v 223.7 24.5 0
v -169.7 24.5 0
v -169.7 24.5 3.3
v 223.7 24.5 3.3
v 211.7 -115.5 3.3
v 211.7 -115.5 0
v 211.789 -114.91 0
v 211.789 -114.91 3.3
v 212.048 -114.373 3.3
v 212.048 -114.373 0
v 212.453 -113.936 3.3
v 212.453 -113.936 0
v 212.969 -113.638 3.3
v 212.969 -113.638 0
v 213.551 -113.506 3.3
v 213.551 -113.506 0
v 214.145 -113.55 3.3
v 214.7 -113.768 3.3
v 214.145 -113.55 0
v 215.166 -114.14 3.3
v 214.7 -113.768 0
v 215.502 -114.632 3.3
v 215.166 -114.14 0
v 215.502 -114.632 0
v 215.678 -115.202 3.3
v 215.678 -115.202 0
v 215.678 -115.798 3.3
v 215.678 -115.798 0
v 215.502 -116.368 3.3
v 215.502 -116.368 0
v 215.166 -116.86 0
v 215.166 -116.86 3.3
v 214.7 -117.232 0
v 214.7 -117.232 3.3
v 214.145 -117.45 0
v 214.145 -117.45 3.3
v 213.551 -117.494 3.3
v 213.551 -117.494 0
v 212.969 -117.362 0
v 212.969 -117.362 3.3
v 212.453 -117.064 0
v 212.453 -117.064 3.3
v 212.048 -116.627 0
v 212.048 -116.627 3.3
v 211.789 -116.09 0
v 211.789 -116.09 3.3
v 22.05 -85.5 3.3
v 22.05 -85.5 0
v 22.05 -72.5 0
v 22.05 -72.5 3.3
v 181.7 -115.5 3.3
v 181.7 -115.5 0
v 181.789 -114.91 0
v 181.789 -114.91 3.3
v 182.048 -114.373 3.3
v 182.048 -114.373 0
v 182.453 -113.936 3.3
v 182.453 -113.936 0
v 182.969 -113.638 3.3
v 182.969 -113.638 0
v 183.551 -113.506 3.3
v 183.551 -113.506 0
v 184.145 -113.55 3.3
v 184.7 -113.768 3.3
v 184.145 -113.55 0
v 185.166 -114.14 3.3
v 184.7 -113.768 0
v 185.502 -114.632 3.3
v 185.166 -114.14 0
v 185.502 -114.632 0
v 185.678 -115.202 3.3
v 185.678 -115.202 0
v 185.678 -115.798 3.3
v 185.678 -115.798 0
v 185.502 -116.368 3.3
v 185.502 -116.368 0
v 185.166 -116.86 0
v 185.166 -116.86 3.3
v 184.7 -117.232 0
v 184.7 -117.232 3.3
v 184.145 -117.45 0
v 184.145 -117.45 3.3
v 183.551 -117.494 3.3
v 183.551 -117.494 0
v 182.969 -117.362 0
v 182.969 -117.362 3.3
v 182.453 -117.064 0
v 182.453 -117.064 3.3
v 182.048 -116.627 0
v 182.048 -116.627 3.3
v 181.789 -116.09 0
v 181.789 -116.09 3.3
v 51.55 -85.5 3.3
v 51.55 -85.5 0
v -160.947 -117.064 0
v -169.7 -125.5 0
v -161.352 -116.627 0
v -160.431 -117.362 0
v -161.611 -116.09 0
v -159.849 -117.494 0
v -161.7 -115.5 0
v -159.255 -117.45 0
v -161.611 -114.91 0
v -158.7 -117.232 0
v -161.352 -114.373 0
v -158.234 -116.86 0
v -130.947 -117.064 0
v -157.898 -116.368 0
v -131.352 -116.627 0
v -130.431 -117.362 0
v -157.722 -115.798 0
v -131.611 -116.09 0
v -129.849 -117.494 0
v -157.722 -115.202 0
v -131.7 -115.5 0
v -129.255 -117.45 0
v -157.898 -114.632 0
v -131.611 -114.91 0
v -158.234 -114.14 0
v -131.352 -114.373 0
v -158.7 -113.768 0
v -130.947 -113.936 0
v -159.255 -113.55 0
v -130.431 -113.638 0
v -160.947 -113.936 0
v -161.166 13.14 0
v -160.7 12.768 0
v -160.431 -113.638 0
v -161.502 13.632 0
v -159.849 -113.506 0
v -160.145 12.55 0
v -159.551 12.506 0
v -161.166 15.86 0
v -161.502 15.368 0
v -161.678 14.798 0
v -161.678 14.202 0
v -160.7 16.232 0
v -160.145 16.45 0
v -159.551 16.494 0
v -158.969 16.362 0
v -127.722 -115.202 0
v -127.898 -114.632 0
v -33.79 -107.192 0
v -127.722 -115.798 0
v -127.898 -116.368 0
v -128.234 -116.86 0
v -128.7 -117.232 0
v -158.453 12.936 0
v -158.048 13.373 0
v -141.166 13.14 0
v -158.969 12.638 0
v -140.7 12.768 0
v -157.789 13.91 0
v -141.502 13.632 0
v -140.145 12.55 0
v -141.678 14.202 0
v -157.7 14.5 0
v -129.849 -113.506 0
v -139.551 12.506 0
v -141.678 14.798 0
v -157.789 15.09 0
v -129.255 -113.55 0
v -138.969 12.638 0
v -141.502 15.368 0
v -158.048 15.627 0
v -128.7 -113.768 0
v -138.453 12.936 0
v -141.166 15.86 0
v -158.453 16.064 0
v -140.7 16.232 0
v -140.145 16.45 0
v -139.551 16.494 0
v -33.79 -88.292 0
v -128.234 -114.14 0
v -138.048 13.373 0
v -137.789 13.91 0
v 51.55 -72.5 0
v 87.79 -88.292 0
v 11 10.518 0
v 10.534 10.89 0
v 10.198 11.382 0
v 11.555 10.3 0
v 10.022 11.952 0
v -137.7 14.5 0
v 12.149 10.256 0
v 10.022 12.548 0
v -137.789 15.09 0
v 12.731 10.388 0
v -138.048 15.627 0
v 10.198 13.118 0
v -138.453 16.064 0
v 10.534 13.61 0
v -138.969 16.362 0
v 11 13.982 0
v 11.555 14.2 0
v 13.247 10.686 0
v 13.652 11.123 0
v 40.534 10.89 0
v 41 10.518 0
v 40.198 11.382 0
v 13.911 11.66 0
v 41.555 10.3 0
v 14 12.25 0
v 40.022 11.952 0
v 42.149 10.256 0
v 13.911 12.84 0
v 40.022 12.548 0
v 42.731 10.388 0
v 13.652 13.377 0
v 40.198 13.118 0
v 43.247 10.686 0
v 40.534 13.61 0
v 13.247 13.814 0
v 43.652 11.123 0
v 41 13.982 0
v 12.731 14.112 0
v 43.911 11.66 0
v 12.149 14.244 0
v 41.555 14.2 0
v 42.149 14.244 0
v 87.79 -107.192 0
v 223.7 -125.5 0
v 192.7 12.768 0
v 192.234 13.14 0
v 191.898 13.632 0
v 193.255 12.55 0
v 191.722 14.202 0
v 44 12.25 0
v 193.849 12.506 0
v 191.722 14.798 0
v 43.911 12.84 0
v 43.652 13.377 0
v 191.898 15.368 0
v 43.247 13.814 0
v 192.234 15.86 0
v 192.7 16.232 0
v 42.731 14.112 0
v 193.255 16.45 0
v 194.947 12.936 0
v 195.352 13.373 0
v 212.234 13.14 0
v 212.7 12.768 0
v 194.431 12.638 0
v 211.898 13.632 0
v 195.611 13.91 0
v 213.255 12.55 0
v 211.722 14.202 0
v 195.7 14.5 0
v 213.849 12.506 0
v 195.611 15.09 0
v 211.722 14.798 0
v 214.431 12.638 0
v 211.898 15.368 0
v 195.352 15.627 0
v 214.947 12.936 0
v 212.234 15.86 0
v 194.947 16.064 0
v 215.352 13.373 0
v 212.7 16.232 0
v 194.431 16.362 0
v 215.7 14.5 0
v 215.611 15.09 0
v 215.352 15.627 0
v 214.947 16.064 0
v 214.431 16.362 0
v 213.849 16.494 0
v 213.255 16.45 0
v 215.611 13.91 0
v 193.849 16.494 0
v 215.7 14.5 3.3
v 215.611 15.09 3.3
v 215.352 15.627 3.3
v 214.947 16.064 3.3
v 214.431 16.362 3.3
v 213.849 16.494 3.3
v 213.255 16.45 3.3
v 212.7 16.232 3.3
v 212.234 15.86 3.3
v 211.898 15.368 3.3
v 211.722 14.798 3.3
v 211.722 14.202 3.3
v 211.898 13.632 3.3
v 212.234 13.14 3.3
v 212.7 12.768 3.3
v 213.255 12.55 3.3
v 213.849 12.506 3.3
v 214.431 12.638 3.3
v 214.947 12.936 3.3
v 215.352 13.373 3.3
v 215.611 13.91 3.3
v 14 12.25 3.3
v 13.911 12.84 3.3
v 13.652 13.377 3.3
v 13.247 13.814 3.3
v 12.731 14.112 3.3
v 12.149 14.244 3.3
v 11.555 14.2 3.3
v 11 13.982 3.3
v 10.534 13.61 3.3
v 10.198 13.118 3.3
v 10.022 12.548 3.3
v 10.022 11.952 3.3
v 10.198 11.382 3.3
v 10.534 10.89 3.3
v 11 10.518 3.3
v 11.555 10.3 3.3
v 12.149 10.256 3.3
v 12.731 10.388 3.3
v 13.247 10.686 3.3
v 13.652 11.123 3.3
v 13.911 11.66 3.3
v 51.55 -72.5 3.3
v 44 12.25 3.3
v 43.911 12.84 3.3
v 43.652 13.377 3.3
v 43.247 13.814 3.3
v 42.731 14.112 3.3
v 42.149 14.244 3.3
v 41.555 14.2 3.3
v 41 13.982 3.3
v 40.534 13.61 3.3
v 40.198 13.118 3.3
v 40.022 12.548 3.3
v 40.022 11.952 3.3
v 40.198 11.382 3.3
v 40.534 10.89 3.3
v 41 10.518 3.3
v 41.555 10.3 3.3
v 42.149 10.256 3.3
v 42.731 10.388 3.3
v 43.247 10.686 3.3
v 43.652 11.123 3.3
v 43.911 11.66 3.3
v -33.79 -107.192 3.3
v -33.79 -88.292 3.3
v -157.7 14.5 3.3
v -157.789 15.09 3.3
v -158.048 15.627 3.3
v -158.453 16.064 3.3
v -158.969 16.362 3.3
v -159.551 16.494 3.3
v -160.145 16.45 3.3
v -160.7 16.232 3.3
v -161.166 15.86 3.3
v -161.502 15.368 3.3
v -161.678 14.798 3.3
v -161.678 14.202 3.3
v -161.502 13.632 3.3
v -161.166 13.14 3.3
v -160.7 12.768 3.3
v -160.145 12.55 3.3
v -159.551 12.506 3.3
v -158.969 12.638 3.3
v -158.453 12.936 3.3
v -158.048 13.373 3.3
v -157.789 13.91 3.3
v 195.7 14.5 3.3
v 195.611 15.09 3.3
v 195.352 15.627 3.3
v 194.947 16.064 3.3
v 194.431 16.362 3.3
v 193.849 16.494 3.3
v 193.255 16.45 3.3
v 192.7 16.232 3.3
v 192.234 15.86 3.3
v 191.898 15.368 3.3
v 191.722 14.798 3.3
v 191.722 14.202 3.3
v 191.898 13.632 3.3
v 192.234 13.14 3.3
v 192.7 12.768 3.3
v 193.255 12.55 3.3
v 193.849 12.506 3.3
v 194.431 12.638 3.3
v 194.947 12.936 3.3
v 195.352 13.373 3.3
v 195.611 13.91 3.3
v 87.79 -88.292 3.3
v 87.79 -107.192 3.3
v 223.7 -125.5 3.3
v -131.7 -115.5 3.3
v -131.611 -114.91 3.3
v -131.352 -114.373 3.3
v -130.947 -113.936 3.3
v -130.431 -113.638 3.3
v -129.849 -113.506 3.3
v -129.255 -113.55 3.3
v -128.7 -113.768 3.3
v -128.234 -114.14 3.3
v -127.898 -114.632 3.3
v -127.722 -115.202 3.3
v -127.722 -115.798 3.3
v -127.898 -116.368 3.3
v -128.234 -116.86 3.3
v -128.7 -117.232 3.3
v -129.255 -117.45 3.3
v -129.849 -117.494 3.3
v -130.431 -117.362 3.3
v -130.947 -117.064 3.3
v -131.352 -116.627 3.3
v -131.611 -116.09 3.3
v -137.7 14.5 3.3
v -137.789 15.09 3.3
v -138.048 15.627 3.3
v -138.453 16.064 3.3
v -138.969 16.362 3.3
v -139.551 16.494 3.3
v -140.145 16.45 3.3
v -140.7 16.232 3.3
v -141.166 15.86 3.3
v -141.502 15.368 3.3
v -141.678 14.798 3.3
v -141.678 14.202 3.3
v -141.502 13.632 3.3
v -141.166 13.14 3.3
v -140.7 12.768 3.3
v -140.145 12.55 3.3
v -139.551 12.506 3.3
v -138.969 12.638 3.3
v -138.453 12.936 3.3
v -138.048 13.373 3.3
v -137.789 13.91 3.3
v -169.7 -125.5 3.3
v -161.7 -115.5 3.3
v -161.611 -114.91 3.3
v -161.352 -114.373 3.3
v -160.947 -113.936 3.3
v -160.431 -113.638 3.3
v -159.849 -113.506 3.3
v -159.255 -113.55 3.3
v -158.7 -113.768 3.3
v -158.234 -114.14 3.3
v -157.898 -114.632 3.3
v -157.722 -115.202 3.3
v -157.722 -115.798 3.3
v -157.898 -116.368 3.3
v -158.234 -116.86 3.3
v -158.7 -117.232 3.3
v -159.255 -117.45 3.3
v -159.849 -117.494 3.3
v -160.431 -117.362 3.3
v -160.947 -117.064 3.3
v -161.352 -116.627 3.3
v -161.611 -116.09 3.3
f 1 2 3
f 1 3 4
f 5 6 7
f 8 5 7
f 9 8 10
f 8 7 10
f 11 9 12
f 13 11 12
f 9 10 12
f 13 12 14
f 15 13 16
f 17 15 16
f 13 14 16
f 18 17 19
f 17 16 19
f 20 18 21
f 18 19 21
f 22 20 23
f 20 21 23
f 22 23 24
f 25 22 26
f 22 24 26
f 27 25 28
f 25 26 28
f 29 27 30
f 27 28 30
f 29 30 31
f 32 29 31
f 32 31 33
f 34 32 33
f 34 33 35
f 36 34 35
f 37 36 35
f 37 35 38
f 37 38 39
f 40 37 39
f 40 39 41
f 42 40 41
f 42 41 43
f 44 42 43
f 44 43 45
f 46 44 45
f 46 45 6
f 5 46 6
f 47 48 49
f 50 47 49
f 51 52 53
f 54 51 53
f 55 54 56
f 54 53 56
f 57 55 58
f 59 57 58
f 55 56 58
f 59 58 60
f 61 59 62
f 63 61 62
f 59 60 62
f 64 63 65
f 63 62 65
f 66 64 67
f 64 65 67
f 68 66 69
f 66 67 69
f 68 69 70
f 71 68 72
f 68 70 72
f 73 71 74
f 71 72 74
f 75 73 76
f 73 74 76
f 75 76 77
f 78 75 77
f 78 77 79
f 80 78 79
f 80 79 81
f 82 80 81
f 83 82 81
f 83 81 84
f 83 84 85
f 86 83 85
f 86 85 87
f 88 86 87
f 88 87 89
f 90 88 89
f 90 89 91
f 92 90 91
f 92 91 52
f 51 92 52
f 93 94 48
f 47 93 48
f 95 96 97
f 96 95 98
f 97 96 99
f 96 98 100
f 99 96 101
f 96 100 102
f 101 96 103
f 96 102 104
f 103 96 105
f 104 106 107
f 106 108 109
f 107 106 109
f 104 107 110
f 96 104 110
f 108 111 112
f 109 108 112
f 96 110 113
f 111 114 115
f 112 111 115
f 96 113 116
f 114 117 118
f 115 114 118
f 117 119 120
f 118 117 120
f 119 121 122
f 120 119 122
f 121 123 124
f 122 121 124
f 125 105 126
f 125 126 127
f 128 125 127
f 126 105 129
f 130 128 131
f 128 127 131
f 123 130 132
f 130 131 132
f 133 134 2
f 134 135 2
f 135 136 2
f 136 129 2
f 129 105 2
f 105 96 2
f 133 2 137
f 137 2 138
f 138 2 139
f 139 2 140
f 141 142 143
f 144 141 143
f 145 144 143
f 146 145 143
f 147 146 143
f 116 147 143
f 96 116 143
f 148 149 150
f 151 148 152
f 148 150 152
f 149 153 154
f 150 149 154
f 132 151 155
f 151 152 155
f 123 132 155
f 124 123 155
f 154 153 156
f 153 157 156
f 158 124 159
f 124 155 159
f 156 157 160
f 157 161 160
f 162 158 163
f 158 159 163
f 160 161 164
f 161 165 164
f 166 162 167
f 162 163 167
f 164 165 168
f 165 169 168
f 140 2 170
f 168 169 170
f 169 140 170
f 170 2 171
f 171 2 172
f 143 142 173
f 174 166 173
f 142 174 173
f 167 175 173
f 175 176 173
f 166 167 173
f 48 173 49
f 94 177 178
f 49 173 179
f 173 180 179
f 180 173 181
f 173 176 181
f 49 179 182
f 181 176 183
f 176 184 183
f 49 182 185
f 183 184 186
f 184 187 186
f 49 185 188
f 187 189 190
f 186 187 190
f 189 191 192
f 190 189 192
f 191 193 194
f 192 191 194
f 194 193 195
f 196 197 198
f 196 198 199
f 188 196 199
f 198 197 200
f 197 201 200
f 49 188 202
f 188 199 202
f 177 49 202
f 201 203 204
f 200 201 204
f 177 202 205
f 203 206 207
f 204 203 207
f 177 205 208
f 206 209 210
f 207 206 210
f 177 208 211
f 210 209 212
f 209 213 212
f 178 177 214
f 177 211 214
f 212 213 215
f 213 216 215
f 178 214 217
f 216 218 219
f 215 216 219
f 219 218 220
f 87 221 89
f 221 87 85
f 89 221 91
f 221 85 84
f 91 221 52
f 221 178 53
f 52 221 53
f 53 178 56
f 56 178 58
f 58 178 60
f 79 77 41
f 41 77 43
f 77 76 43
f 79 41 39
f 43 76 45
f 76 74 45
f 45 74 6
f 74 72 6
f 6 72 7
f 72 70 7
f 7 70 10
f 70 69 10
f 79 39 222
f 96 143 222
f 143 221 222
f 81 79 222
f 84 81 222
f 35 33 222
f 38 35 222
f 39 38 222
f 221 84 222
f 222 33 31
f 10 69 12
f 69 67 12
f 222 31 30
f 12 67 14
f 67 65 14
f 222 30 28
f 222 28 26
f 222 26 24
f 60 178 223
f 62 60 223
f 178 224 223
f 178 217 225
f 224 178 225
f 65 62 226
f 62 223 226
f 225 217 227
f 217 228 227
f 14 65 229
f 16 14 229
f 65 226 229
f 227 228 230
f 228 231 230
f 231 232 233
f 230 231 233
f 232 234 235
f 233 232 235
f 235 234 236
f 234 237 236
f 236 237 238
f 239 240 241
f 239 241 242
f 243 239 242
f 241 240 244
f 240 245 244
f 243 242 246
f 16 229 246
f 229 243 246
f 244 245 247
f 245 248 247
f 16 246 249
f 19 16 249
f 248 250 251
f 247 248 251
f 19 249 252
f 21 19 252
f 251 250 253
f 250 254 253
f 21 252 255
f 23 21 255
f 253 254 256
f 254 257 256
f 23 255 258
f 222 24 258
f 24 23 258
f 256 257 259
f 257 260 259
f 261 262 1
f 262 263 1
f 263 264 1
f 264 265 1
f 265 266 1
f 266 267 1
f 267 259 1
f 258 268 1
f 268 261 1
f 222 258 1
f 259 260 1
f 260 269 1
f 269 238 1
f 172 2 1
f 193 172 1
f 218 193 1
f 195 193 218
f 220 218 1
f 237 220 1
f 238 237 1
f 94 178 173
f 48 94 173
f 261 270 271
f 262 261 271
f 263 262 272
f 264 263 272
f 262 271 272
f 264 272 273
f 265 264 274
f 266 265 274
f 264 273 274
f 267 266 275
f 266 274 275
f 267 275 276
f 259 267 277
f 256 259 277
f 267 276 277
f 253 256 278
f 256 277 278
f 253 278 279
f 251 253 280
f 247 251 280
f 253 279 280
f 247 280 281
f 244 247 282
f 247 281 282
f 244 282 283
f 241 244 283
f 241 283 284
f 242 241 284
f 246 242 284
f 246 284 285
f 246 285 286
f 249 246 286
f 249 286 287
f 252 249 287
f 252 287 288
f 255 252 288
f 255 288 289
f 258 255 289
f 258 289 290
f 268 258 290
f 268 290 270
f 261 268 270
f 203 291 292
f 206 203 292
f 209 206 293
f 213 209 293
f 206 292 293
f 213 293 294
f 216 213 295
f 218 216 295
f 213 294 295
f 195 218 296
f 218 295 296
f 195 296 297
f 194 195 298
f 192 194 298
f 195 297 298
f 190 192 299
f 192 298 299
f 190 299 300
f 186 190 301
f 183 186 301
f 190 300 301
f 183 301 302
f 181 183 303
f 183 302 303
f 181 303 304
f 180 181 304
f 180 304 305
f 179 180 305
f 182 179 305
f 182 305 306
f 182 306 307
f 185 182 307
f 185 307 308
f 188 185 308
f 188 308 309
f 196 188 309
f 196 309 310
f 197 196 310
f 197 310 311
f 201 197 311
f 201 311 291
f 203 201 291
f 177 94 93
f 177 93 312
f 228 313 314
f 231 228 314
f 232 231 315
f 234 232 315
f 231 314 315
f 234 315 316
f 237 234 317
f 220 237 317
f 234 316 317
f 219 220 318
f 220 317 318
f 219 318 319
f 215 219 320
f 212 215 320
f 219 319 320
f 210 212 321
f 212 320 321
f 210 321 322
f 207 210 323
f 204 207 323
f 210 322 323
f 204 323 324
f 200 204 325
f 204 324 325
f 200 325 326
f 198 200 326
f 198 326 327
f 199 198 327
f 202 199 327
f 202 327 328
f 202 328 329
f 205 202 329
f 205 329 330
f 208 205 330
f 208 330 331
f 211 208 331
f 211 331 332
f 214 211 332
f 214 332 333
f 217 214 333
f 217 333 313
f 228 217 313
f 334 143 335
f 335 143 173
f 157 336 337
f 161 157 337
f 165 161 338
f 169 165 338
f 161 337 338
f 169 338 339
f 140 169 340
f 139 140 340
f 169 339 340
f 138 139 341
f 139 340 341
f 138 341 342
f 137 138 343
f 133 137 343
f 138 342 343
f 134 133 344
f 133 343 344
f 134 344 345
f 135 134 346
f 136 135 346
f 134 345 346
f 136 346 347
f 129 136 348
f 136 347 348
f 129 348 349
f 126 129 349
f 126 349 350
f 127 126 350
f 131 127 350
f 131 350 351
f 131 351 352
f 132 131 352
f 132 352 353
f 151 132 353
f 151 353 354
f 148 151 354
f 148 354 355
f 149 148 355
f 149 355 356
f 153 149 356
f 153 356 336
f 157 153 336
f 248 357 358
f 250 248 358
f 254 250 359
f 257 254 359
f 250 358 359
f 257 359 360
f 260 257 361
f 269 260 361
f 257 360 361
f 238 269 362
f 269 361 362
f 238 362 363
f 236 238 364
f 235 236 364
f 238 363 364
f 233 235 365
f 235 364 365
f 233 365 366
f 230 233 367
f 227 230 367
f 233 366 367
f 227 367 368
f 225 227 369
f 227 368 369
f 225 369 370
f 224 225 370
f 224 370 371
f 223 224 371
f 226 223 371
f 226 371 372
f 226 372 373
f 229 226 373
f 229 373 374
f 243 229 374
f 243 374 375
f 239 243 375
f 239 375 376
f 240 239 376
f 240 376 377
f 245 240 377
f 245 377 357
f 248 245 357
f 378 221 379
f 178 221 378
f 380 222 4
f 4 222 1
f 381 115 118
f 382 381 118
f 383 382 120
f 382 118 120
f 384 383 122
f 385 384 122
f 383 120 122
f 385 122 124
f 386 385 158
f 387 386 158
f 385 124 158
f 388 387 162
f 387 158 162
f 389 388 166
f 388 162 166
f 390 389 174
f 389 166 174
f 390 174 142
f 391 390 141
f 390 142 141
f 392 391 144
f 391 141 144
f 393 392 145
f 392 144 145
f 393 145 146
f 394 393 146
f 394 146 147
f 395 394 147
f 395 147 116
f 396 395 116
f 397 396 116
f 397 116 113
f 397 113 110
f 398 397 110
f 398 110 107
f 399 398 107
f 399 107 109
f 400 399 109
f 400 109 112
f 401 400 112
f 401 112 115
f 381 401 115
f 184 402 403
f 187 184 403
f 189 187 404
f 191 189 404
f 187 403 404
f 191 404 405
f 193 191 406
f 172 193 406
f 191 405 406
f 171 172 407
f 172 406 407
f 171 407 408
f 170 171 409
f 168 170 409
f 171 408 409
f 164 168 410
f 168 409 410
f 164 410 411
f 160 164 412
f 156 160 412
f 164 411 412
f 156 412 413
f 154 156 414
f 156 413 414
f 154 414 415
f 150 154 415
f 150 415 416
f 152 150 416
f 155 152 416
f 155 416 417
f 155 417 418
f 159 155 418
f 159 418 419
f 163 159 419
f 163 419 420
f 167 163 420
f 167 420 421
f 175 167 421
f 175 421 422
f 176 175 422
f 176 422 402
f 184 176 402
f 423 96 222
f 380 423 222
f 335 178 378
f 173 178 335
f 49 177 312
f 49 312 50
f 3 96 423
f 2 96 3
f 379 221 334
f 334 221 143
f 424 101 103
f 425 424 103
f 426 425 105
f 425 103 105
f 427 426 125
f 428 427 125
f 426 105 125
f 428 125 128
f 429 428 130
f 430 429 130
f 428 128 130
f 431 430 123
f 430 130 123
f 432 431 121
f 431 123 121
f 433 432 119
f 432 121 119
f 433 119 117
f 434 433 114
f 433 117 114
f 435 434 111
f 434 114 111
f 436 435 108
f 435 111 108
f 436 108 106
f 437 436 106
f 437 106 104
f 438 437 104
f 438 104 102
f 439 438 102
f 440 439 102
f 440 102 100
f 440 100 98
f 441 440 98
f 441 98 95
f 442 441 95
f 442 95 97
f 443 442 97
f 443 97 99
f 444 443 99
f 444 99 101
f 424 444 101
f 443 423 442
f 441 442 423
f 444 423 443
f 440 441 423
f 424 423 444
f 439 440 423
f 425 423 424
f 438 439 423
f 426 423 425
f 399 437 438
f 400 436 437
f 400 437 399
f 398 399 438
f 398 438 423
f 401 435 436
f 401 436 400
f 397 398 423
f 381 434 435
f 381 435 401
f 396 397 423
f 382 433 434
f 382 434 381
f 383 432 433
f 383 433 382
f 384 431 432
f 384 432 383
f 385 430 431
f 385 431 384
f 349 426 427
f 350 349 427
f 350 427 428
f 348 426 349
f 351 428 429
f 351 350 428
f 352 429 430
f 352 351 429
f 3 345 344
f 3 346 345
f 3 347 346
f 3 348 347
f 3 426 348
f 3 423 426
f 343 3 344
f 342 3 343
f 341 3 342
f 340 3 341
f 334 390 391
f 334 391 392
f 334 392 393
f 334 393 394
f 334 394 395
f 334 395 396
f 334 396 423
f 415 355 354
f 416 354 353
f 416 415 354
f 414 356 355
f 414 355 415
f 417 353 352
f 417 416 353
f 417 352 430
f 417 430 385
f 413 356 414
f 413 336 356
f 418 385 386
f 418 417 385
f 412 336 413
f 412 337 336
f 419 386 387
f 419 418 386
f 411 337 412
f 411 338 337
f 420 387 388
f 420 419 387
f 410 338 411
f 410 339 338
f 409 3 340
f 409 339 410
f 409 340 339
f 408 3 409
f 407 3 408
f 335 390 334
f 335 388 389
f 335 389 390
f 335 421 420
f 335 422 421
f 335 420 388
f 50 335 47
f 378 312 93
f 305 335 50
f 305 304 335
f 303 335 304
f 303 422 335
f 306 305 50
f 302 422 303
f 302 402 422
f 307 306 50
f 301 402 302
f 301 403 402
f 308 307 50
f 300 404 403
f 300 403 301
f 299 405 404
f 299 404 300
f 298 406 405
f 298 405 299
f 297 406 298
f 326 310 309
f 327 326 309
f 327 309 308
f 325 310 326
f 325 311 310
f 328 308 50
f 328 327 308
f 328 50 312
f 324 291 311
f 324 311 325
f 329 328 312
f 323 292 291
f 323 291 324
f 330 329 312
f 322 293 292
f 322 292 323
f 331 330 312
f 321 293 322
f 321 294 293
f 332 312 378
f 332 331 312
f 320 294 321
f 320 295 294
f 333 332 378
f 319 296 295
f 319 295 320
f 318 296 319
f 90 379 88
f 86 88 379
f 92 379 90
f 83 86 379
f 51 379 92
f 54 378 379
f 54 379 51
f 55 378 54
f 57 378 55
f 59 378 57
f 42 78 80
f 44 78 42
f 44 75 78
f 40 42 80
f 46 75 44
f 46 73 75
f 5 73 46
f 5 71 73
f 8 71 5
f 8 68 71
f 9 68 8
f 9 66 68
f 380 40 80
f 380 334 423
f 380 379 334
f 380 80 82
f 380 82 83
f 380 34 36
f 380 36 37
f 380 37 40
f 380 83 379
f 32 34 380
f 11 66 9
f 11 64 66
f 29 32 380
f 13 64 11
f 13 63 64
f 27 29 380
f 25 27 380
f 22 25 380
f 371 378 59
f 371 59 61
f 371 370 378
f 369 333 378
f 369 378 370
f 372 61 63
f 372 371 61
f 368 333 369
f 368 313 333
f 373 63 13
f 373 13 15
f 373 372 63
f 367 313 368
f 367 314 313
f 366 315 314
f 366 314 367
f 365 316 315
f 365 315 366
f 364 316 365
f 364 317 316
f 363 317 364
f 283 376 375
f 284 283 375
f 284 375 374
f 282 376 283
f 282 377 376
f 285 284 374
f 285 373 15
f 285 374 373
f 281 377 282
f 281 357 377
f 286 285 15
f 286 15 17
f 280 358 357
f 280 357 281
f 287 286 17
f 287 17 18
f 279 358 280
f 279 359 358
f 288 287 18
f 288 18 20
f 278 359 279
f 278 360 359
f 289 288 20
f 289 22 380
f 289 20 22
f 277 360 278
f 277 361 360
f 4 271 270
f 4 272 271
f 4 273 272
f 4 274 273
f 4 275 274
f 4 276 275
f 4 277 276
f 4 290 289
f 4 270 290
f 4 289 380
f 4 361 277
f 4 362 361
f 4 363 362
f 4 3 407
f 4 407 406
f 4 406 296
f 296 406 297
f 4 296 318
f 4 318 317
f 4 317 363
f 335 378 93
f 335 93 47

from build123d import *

# Parameters (mm, degrees)
SKETCH1_W           = 393.4
SKETCH1_H           = 150
BOSS_EXTRUDE1_DEPTH = 3.3
SKETCH2_R           = 2
CUT_EXTRUDE1_DEPTH  = 257.520622953
SKETCH3_R           = 2
CUT_EXTRUDE2_DEPTH  = 4
SKETCH4_R           = 2
CUT_EXTRUDE3_DEPTH  = 4
SKETCH6_W           = 29.5
SKETCH6_H           = 13
SKETCH6_W_2         = 121.579447476
SKETCH6_H_2         = 18.9
CUT_EXTRUDE4_DEPTH  = 10


with BuildPart() as part:
    # Sketch1 → Boss-Extrude1 (new body)
    with BuildSketch(Plane.XY):
        with Locations((27, -50.5)):
            Rectangle(SKETCH1_W, SKETCH1_H)
    extrude(amount=BOSS_EXTRUDE1_DEPTH)

    # Sketch2 → Cut-Extrude1 (cut, through all)
    with BuildSketch(Plane(origin=(0, 0, 0), x_dir=(-1, 0, 0), z_dir=(0, 0, -1))):
        with Locations((-183.7, -115.5)):
            Circle(SKETCH2_R)
        with Locations((-213.7, -115.5)):
            Circle(SKETCH2_R)
        with Locations((129.7, -115.5)):
            Circle(SKETCH2_R)
        with Locations((159.7, -115.5)):
            Circle(SKETCH2_R)
    extrude(amount=-CUT_EXTRUDE1_DEPTH, mode=Mode.SUBTRACT)

    # Sketch3 → Cut-Extrude2 (cut)
    with BuildSketch(Plane.XY.offset(3.3)):
        with Locations((-159.7, 14.5)):
            Circle(SKETCH3_R)
        with Locations((-139.7, 14.5)):
            Circle(SKETCH3_R)
        with Locations((193.7, 14.5)):
            Circle(SKETCH3_R)
        with Locations((213.7, 14.5)):
            Circle(SKETCH3_R)
    extrude(amount=-CUT_EXTRUDE2_DEPTH, mode=Mode.SUBTRACT)

    # Sketch4 → Cut-Extrude3 (cut)
    with BuildSketch(Plane.XY.offset(3.3)):
        with Locations((12, 12.25)):
            Circle(SKETCH4_R)
        with Locations((42, 12.25)):
            Circle(SKETCH4_R)
    extrude(amount=-CUT_EXTRUDE3_DEPTH, mode=Mode.SUBTRACT)

    # Sketch6 → Cut-Extrude4 (cut)
    with BuildSketch(Plane(origin=(0, 0, 0), x_dir=(-1, 0, 0), z_dir=(0, 0, -1))):
        with Locations((-36.8, -79)):
            Rectangle(SKETCH6_W, SKETCH6_H)
        with Locations((-27, -97.742382112)):
            Rectangle(SKETCH6_W_2, SKETCH6_H_2)
    extrude(amount=-CUT_EXTRUDE4_DEPTH, mode=Mode.SUBTRACT)


solid = part.part
